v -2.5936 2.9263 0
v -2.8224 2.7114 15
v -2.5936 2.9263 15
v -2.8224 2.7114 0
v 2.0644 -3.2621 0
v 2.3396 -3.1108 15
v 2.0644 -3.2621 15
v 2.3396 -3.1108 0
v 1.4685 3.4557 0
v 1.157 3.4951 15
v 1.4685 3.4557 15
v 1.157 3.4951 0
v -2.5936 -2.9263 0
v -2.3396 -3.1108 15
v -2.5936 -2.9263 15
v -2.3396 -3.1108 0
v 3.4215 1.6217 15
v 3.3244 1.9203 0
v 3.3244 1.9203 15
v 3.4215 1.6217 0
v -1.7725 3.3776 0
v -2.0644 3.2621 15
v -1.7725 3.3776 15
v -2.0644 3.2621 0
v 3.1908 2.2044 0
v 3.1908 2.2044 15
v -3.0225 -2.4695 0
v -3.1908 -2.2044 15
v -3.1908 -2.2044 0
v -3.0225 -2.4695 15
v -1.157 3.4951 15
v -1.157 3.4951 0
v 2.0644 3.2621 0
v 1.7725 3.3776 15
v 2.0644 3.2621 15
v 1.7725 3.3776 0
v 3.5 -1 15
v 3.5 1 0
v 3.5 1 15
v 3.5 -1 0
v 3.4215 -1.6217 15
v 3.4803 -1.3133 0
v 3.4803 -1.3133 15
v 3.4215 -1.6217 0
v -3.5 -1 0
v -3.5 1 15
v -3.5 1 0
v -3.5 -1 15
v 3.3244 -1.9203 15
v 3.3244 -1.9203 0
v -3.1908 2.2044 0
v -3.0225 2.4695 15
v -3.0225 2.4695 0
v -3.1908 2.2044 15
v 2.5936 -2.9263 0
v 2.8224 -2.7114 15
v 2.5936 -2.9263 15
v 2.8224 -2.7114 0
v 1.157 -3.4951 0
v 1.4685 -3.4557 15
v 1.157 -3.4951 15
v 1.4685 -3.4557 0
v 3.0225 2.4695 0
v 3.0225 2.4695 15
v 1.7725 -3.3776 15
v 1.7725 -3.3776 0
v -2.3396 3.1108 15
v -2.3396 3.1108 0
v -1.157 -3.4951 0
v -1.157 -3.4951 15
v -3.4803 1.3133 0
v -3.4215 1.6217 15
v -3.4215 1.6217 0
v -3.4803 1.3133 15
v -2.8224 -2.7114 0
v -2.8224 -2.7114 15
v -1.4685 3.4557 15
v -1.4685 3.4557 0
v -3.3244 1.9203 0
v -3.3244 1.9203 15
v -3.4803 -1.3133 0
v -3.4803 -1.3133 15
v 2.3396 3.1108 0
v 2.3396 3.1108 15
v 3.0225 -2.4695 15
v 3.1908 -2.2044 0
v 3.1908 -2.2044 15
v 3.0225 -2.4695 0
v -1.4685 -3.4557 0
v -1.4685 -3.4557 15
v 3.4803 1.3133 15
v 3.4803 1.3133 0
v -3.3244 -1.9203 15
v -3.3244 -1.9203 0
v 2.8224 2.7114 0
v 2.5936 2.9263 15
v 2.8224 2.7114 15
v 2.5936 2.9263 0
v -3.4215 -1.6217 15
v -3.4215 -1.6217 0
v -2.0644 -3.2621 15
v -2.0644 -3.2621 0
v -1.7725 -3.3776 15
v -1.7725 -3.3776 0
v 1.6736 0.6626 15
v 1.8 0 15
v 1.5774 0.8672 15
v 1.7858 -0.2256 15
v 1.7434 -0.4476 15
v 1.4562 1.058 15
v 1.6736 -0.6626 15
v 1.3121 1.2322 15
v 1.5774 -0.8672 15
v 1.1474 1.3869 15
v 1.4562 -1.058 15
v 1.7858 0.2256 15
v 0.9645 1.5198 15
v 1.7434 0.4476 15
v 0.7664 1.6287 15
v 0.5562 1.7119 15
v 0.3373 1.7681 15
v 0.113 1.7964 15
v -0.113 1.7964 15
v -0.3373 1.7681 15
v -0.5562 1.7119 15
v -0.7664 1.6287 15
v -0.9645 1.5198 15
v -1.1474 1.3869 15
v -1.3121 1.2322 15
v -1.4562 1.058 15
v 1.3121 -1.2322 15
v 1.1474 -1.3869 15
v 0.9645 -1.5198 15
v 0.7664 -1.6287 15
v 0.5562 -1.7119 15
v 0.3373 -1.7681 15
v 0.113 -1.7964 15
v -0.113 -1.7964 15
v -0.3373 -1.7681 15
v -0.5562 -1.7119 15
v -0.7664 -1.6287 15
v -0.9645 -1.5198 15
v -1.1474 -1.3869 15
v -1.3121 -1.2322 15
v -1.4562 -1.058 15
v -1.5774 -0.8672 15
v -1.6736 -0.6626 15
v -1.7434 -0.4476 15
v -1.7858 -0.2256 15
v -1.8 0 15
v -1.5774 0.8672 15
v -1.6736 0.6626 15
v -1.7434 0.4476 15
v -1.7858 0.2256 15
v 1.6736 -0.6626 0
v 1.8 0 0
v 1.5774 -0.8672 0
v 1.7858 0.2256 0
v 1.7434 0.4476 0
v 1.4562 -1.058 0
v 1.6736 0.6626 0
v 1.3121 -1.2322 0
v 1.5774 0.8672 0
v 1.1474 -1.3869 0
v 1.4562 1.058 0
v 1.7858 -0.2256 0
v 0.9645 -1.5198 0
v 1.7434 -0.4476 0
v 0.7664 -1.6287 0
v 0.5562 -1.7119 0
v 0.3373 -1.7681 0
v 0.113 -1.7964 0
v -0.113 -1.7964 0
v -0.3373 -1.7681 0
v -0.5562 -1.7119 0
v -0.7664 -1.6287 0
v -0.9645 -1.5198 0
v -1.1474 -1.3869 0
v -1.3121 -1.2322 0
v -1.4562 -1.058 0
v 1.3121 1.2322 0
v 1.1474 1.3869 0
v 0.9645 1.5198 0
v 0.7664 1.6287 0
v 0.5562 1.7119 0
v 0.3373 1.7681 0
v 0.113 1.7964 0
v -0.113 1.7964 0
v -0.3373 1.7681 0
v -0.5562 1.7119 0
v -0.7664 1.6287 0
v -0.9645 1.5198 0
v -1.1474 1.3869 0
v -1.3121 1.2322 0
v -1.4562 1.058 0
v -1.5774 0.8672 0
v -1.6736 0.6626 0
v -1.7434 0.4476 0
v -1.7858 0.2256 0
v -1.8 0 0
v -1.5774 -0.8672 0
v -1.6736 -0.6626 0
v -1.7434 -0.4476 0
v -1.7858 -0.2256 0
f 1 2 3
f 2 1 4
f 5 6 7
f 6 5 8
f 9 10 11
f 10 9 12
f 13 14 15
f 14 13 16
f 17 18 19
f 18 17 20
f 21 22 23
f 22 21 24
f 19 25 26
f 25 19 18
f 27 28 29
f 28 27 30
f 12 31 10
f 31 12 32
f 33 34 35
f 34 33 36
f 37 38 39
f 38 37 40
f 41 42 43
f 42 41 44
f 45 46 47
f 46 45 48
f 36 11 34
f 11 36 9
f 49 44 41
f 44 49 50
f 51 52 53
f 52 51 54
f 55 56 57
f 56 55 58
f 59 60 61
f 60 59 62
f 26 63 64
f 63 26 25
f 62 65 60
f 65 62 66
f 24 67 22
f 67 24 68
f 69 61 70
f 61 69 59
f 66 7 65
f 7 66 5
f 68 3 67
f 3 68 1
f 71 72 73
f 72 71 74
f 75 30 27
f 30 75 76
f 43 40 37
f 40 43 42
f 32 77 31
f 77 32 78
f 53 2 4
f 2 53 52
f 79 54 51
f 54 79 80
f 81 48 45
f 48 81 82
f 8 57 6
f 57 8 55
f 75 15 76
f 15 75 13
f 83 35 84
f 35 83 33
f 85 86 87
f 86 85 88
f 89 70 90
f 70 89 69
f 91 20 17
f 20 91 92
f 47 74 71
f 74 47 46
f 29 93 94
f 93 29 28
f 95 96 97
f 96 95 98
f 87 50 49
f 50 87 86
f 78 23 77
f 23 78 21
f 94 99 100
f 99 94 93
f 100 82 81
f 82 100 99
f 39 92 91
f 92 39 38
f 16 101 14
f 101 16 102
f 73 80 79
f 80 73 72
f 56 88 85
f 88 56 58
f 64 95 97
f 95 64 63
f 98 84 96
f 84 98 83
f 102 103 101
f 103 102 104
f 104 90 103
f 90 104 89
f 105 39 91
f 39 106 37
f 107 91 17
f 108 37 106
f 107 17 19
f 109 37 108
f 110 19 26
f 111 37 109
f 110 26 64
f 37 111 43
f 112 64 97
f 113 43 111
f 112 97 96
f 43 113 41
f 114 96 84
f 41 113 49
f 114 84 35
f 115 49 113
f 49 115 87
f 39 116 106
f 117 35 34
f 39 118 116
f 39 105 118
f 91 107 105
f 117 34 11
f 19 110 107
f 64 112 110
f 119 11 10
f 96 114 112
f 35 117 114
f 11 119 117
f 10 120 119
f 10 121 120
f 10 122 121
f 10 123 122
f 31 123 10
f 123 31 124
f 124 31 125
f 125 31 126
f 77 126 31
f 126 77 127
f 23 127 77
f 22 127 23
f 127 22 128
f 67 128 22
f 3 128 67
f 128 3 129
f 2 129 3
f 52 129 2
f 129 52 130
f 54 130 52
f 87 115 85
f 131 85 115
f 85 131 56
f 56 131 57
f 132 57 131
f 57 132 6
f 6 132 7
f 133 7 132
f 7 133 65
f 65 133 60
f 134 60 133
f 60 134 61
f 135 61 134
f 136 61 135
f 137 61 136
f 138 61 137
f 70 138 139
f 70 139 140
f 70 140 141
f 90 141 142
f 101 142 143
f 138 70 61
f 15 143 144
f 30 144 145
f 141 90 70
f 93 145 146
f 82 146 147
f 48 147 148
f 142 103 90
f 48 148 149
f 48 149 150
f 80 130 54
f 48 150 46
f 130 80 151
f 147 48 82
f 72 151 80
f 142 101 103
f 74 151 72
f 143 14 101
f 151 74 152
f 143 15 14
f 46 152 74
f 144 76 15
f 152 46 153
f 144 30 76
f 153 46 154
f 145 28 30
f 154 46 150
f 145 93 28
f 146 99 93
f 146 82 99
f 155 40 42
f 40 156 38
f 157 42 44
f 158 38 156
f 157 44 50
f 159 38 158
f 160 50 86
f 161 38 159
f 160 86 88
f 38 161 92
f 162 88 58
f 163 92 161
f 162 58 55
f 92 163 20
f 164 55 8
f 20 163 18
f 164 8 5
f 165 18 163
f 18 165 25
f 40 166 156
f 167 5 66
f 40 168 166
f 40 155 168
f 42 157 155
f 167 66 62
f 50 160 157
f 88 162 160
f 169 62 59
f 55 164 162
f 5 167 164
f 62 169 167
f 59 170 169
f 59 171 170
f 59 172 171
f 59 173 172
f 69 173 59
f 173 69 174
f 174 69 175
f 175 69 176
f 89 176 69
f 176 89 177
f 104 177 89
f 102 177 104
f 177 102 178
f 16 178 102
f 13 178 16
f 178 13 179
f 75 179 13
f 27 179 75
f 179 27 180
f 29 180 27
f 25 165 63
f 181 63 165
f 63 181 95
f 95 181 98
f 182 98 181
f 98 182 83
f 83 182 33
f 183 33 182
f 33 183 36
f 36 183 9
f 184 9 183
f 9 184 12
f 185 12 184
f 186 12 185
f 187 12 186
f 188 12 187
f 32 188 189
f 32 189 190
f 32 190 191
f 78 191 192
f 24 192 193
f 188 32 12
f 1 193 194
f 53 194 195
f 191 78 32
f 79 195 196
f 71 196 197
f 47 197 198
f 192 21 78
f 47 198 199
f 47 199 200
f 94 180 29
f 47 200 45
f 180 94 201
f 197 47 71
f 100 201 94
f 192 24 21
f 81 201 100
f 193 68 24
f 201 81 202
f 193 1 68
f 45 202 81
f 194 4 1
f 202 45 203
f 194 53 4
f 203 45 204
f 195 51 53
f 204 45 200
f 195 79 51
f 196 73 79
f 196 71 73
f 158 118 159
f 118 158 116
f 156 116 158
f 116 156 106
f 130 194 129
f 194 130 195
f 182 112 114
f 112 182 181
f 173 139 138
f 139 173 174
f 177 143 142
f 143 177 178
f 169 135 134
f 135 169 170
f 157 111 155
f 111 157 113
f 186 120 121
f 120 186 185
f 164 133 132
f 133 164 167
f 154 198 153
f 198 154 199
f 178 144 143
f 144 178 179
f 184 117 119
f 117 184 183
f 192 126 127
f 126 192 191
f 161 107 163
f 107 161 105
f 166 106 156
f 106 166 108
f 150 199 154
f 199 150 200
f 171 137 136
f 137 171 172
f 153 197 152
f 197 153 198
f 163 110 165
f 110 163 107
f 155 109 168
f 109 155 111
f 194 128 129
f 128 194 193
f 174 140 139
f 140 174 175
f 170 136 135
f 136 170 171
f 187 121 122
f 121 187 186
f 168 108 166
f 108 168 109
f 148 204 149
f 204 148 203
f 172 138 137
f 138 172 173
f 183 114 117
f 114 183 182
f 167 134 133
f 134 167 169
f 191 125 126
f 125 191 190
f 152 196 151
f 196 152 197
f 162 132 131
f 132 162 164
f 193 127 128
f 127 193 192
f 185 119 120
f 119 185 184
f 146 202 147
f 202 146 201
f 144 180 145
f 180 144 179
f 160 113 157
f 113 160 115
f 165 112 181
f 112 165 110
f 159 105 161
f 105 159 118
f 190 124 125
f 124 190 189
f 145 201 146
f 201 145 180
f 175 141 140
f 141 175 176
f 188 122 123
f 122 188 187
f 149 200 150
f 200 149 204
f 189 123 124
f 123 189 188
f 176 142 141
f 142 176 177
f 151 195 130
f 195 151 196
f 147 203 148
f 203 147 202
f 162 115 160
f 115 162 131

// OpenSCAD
$fn = 50;


difference() {
	union() {
		translate(v = [0, 0, 0]) {
			rotate(a = [0, 0, 0]) {
				hull() {
					translate(v = [-1.0000000000, 1.0000000000, 0]) {
						rotate(a = [0, 0, 0]) {
							translate(v = [0, 0, 0]) {
								rotate(a = [0, 0, 0]) {
									cylinder(h = 15, r = 2.5000000000);
								}
							}
						}
					}
					translate(v = [1.0000000000, 1.0000000000, 0]) {
						rotate(a = [0, 0, 0]) {
							translate(v = [0, 0, 0]) {
								rotate(a = [0, 0, 0]) {
									cylinder(h = 15, r = 2.5000000000);
								}
							}
						}
					}
					translate(v = [-1.0000000000, -1.0000000000, 0]) {
						rotate(a = [0, 0, 0]) {
							translate(v = [0, 0, 0]) {
								rotate(a = [0, 0, 0]) {
									cylinder(h = 15, r = 2.5000000000);
								}
							}
						}
					}
					translate(v = [1.0000000000, -1.0000000000, 0]) {
						rotate(a = [0, 0, 0]) {
							translate(v = [0, 0, 0]) {
								rotate(a = [0, 0, 0]) {
									cylinder(h = 15, r = 2.5000000000);
								}
							}
						}
					}
				}
			}
		}
	}
	union() {
		translate(v = [0.0000000000, 0.0000000000, 0]) {
			rotate(a = [0, 0, 0]) {
				translate(v = [0, 0, -50]) {
					rotate(a = [0, 0, 0]) {
						cylinder(h = 100, r = 1.8000000000);
					}
				}
			}
		}
	}
}
